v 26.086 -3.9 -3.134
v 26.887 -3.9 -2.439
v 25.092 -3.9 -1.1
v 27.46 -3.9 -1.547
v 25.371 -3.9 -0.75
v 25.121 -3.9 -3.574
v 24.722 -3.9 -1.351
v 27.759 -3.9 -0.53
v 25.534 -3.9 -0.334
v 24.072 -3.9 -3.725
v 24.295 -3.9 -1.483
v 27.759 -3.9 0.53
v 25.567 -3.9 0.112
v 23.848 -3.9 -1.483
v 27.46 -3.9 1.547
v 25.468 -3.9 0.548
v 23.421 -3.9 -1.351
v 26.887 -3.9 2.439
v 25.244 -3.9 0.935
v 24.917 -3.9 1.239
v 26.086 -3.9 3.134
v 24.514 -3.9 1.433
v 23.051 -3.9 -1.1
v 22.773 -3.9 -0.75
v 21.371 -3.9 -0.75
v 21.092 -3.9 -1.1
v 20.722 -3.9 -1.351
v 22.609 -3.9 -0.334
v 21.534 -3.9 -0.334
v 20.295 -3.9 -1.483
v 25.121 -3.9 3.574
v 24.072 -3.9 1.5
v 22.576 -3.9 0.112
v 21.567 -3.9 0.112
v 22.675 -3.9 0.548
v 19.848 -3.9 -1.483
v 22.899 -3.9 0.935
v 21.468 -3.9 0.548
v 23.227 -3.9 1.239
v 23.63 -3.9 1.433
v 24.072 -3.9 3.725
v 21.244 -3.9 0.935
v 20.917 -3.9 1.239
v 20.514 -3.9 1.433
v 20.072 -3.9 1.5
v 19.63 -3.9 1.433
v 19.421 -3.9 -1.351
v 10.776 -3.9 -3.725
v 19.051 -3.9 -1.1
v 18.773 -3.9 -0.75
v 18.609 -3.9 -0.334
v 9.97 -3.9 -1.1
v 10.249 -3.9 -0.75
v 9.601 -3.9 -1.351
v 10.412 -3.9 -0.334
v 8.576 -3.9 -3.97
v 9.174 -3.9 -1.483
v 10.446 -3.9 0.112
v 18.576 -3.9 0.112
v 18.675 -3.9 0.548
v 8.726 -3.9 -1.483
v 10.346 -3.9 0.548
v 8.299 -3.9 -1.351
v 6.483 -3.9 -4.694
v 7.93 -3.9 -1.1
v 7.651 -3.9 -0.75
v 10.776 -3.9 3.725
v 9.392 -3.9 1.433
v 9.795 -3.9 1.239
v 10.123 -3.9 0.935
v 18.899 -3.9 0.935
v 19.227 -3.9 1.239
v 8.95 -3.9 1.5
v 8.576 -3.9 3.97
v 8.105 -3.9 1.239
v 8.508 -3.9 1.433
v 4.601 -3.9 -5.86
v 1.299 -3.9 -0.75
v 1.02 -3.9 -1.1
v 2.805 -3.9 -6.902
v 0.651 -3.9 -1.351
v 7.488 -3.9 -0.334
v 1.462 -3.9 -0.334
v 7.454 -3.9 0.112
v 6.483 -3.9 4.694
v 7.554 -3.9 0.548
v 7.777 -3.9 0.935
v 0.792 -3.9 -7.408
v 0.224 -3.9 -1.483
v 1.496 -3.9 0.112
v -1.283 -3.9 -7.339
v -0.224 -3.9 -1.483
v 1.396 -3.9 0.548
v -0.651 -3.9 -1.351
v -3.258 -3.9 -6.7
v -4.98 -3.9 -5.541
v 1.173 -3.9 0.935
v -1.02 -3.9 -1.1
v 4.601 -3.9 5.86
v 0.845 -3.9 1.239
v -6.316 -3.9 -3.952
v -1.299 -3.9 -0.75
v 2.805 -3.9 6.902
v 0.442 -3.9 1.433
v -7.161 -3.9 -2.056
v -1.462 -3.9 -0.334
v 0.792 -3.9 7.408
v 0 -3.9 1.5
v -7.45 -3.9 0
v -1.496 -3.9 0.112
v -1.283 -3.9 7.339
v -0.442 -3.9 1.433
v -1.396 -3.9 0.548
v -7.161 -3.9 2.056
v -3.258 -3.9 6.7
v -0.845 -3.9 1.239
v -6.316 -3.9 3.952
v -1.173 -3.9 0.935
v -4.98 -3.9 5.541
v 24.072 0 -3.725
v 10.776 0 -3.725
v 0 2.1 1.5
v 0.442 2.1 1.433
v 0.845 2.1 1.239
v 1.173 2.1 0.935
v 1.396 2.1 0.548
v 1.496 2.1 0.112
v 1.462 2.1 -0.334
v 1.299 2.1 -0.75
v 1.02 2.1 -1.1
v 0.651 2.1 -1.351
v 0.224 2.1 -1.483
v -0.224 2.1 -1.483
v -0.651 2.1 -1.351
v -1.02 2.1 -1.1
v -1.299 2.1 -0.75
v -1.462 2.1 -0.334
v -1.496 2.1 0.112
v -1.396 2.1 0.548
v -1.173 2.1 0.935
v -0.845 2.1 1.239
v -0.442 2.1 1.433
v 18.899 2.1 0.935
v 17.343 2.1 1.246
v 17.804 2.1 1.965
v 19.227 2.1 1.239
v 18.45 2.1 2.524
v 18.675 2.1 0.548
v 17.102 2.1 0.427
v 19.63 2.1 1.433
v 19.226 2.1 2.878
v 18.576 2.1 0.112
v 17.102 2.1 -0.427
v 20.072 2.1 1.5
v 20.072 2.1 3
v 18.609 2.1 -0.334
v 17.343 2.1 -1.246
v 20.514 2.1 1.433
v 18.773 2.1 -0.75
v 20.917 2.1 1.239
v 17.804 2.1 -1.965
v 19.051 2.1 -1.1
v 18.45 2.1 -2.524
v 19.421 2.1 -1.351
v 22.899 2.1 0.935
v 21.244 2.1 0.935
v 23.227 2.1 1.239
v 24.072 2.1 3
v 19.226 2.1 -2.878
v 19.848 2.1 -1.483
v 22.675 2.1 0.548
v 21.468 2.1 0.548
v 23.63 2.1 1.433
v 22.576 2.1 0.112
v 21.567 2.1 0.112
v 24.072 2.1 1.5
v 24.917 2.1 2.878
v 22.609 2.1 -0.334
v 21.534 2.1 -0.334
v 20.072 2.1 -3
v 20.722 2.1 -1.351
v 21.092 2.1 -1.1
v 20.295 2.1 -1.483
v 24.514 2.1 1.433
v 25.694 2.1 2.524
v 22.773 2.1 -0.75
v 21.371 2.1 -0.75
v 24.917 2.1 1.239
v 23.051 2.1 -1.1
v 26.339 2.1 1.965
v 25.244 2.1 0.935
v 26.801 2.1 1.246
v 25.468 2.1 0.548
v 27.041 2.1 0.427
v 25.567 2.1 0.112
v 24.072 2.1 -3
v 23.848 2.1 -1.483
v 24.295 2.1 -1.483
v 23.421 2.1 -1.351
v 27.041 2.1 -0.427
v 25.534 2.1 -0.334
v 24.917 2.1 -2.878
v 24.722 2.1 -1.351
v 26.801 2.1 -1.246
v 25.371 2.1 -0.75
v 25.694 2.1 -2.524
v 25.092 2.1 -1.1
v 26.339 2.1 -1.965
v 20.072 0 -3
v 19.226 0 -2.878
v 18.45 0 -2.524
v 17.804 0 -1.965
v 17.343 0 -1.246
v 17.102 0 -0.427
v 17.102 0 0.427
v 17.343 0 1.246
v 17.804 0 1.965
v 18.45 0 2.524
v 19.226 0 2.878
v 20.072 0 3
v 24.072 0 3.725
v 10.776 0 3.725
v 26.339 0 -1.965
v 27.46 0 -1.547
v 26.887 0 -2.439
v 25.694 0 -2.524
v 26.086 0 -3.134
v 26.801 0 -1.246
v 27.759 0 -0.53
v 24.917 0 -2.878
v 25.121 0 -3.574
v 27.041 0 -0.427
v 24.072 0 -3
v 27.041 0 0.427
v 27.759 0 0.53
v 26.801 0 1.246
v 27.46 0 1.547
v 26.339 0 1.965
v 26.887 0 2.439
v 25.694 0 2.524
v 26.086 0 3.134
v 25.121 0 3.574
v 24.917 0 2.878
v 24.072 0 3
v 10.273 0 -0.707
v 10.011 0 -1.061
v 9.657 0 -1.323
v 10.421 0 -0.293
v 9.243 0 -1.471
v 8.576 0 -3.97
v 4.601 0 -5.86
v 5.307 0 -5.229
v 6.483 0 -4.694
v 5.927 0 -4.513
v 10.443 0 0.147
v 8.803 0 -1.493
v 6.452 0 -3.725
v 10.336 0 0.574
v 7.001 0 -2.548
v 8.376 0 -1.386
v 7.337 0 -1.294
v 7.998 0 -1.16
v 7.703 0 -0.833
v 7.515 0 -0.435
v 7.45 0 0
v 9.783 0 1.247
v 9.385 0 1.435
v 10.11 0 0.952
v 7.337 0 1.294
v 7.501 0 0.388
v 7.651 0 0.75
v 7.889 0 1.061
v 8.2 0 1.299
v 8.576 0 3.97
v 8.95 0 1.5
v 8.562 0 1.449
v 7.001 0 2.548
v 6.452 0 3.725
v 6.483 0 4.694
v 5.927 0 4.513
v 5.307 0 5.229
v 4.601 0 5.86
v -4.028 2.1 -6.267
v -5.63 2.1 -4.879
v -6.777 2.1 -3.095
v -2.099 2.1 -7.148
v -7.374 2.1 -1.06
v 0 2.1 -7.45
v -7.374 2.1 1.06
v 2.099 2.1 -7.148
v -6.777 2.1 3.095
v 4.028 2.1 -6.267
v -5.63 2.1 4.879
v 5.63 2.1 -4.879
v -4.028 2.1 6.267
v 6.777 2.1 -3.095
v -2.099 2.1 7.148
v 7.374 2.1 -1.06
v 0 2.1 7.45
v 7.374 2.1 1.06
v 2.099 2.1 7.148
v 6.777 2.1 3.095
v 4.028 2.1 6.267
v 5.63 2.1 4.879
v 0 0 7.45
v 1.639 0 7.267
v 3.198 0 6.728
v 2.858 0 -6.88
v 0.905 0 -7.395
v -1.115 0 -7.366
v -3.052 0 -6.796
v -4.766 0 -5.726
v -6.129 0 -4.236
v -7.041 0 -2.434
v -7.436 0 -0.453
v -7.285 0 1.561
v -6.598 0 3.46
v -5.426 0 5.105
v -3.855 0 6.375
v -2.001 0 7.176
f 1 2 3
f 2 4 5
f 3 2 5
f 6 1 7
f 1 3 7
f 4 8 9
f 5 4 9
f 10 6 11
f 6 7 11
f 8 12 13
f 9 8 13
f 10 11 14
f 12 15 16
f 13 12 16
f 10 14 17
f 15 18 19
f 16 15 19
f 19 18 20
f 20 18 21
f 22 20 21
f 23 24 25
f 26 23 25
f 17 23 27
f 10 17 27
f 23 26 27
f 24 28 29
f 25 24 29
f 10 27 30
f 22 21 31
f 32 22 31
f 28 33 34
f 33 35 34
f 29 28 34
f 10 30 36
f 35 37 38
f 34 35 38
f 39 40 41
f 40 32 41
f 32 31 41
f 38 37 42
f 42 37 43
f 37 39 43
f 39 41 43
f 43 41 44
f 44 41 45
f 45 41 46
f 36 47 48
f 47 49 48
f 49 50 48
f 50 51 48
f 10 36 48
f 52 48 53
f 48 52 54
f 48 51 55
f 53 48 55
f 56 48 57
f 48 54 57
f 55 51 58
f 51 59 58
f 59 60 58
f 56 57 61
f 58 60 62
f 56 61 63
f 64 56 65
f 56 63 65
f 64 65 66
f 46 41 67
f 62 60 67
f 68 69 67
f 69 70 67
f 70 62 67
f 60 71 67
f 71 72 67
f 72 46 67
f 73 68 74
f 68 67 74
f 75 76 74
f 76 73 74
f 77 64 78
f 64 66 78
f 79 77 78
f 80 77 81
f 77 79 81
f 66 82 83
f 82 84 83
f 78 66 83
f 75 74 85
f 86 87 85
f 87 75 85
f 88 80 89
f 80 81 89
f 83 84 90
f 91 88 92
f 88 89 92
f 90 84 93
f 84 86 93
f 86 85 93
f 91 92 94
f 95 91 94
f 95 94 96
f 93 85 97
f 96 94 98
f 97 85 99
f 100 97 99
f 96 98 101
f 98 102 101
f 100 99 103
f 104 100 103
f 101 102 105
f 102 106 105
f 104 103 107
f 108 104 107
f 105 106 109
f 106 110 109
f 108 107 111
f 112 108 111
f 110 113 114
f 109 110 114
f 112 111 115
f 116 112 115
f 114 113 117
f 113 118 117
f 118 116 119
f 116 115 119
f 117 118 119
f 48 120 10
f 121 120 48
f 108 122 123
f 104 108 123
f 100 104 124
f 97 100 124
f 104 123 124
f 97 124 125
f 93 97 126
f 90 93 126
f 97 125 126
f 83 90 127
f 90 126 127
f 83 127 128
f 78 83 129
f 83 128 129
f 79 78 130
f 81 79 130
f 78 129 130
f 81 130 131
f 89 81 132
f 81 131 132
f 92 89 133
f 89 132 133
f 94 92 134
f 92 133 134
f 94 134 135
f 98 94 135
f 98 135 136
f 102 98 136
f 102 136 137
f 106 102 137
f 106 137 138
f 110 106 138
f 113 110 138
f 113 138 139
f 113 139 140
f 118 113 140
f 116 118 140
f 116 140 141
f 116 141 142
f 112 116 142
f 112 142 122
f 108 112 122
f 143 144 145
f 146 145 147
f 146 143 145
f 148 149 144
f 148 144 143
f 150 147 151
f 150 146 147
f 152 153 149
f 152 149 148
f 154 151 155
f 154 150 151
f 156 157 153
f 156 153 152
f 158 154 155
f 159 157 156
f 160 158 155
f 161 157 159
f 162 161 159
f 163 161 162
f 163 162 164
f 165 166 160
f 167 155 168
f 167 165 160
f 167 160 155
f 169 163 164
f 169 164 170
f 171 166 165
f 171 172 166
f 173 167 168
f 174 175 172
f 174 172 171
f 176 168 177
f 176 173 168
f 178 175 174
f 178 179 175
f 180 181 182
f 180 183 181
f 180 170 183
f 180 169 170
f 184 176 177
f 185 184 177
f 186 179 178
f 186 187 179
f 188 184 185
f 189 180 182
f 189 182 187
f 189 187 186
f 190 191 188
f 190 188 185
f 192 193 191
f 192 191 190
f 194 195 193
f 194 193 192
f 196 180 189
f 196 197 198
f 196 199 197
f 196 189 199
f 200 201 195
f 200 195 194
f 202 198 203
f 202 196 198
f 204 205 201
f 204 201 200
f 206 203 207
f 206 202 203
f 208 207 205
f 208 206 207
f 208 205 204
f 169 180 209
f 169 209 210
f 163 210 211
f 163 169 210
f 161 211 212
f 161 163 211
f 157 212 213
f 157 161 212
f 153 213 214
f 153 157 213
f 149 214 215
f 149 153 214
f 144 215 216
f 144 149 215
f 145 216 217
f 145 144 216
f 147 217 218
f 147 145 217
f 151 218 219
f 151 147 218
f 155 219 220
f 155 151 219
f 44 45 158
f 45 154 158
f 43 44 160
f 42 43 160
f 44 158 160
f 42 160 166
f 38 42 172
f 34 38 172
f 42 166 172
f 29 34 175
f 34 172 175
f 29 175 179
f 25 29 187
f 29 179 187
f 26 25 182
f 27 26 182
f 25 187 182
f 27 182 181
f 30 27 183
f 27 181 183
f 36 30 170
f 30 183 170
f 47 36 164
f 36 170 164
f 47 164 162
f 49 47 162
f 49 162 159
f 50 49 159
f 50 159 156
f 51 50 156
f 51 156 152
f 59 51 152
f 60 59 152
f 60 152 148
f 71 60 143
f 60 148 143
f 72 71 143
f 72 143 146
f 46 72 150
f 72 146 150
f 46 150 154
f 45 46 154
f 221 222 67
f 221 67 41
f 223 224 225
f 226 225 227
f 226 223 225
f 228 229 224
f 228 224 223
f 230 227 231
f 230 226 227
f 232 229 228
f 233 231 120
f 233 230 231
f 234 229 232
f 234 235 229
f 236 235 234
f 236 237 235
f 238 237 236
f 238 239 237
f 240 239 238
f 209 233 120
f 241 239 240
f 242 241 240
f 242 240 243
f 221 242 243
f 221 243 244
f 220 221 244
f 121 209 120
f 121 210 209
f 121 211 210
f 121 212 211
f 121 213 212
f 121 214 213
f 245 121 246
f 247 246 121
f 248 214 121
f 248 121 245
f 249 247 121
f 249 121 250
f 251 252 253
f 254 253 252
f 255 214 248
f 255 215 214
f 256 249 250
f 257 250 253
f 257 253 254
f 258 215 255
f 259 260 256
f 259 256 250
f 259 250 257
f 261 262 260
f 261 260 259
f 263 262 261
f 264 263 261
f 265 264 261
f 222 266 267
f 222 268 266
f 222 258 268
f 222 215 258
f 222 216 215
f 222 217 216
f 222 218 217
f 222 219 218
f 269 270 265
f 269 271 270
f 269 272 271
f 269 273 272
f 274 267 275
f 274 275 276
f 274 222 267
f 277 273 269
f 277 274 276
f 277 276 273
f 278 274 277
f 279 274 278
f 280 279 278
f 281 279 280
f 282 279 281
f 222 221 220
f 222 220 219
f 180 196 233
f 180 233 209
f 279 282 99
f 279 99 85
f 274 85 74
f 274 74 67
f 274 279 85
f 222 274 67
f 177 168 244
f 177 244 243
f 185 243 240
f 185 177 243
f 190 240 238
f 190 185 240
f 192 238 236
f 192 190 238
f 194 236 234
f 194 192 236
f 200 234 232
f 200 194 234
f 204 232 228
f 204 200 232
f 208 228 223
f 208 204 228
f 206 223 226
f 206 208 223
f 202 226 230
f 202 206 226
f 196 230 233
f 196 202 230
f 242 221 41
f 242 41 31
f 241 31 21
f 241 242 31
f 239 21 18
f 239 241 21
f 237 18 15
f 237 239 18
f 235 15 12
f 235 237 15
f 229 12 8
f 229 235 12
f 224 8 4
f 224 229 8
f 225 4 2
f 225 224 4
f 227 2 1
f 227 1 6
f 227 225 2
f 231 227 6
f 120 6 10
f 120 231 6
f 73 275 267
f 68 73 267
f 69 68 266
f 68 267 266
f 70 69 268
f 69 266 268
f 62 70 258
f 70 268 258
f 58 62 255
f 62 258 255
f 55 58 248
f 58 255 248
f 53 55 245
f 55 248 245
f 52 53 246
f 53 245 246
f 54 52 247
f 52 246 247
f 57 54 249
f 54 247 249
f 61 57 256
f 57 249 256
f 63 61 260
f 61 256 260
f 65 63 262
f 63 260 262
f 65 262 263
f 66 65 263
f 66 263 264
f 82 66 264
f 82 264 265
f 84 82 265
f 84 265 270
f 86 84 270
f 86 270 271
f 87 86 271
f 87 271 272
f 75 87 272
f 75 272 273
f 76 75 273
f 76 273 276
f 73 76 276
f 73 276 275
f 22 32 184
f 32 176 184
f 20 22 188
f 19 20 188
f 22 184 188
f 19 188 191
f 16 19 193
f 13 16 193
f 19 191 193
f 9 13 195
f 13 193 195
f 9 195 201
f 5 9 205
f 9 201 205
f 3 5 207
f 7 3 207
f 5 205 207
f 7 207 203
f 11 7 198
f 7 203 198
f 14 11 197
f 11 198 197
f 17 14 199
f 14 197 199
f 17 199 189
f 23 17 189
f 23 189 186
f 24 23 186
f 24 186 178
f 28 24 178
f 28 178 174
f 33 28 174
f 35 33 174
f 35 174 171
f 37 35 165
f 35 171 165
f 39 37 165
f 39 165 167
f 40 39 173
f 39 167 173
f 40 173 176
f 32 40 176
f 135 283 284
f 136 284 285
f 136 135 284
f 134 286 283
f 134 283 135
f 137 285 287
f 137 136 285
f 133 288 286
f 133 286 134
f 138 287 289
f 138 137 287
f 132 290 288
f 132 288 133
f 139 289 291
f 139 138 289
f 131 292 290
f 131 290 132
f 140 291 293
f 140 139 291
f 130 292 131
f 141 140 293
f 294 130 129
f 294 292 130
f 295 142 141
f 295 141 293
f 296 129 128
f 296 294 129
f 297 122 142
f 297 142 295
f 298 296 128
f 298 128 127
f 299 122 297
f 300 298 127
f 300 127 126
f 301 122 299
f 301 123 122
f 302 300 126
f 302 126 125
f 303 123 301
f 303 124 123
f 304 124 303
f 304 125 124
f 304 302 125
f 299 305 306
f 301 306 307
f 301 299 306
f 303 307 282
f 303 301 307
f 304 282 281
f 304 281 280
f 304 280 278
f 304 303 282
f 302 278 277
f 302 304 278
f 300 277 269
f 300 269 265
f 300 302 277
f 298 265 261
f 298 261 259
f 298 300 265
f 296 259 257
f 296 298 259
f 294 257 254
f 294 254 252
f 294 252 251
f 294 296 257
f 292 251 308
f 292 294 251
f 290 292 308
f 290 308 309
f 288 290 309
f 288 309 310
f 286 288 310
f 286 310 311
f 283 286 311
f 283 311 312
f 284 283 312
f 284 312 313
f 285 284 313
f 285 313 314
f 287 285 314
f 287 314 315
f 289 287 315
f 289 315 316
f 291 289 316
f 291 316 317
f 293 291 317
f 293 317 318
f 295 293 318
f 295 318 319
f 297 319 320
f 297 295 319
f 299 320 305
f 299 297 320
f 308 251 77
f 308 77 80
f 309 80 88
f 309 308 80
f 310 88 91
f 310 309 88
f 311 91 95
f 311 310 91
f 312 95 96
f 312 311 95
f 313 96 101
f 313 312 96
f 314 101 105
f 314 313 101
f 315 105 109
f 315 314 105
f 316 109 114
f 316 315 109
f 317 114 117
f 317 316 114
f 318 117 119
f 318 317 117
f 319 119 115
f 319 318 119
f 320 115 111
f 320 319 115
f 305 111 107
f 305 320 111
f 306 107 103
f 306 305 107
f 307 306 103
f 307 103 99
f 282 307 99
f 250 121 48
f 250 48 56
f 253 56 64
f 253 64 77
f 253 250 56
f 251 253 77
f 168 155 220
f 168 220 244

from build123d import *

# Parameters (mm, degrees)
SKETCH1_R           = 1.5
SKETCH1_R_2         = 1.5000000000000007
BOSS_EXTRUDE1_DEPTH = 3.9
BOSS_EXTRUDE2_START = 2.1
SKETCH1_3_R         = 7.449999999999999
SKETCH1_3_R_2       = 1.5
SKETCH1_3_R_3       = 1.5000000000000007
BOSS_EXTRUDE2_DEPTH = 2.1
FILLET1_R           = 10


with BuildPart() as part:
    # Sketch1 → Boss-Extrude1 (new body)
    with BuildSketch(Plane(origin=(0, 0, 0), x_dir=(1, 0, 0), z_dir=(0, 1, 0))):
        with BuildLine():
            ThreePointArc((6.451889258194068, 3.7249999999999996), (-7.45, 1.088e-14), (6.451889258194062, -3.725000000000005))
            Line((6.451889258194065, -3.725), (24.071650299632278, -3.725))
            ThreePointArc((24.071650299632278, -3.7249999999999996), (27.796650299632294, -6.66e-15), (24.071650299632292, 3.7250000000000005))
            Line((24.071650299632292, 3.725), (6.451889258194068, 3.725))
        make_face()
        Circle(SKETCH1_R, mode=Mode.SUBTRACT)
        with Locations((8.95, 3.9e-16)):
            Circle(SKETCH1_R, mode=Mode.SUBTRACT)
        with Locations((20.071650299632296, -8.8e-16)):
            Circle(SKETCH1_R_2, mode=Mode.SUBTRACT)
        with Locations((24.071650299632292, 0)):
            Circle(SKETCH1_R_2, mode=Mode.SUBTRACT)
    extrude(amount=-BOSS_EXTRUDE1_DEPTH)

    # Sketch1<3> → Boss-Extrude2 (add)
    # profile 1 of 2: a face of its own
    with BuildSketch(Plane(origin=(0, 0, 0), x_dir=(1, 0, 0), z_dir=(0, 1, 0)).offset(BOSS_EXTRUDE2_START)):
        Circle(SKETCH1_3_R)
        Circle(SKETCH1_3_R_2, mode=Mode.SUBTRACT)
    # profile 2 of 2: a face of its own
    with BuildSketch(Plane(origin=(0, 0, 0), x_dir=(1, 0, 0), z_dir=(0, 1, 0)).offset(BOSS_EXTRUDE2_START)):
        with BuildLine():
            Line((20.071650299632296, -3.0000000000000013), (24.071650299632292, -3))
            ThreePointArc((24.071650299632292, -3), (27.071650299632292, -1.8e-16), (24.071650299632292, 3))
            Line((24.071650299632292, 3), (20.071650299632296, 3.0000000000000004))
            ThreePointArc((20.071650299632296, 3), (17.071650299632296, -2.6e-16), (20.071650299632296, -3.000000000000001))
        make_face()
        with Locations((20.071650299632296, -8.8e-16)):
            Circle(SKETCH1_3_R_3, mode=Mode.SUBTRACT)
        with Locations((24.071650299632292, 0)):
            Circle(SKETCH1_3_R_3, mode=Mode.SUBTRACT)
    extrude(amount=-BOSS_EXTRUDE2_DEPTH)

    # Fillet1
    fillet1_edges = [part.edges().sort_by_distance(p)[0] for p in [
        (6.451889258194068, -1.95, -3.7249999999999996),
        (6.451889258194063, -1.95, 3.7250000000000023),
    ]]
    fillet(fillet1_edges, radius=FILLET1_R)


solid = part.part
